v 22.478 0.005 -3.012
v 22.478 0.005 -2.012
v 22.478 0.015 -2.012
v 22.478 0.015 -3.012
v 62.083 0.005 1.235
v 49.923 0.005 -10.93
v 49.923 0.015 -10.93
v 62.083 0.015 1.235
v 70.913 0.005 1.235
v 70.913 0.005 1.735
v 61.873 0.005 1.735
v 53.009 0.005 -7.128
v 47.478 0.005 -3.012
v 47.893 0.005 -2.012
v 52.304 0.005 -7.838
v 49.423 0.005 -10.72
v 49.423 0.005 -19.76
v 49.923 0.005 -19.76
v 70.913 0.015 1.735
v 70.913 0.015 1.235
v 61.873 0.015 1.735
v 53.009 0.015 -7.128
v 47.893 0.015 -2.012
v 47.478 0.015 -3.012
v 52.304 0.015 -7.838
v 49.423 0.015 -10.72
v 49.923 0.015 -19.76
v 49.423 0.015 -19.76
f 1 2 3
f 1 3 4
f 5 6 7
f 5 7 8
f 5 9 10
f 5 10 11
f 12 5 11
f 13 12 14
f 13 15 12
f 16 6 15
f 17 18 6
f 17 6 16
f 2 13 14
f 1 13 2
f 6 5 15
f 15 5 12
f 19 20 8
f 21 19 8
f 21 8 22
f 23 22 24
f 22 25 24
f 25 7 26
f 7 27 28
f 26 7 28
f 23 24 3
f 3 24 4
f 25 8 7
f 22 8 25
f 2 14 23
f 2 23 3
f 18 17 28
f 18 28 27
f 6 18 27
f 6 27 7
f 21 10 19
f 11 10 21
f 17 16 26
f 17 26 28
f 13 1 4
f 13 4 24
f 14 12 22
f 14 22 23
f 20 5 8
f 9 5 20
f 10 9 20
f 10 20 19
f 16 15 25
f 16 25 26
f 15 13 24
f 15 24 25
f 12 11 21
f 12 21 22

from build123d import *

# Parameters (mm, degrees)
BOSS_EXTRUDE1_DEPTH = 0.02
SCALE2_SCALE        = 0.5


with BuildPart() as part:
    # Sketch1 → Boss-Extrude1 (new body)
    with BuildSketch(Plane(origin=(0, 0, 0), x_dir=(1, 0, 0), z_dir=(0, 1, 0))):
        Polygon((0, 0), (0, 2), (50, 2), (59.652007563, 11.652007563), (53.889087297, 17.41492783), (53.889087297, 35.49492783), (54.889087297, 35.49492783), (54.889087297, 17.83492783), (79.209002128, -6.495331881), (96.869002128, -6.495331881), (96.869002128, -7.495331881), (78.789002128, -7.495331881), (61.061835124, 10.231835124), (50.83, 0), align=None)
    extrude(amount=BOSS_EXTRUDE1_DEPTH)


with BuildPart() as part_1:
    # Scale2: scaled about (44.956647526, 0.01, -4.024879093)
    add(part.part.scale(SCALE2_SCALE).moved(Location((22.478323763, 0.005, -2.012439547))))


solid = part_1.part
